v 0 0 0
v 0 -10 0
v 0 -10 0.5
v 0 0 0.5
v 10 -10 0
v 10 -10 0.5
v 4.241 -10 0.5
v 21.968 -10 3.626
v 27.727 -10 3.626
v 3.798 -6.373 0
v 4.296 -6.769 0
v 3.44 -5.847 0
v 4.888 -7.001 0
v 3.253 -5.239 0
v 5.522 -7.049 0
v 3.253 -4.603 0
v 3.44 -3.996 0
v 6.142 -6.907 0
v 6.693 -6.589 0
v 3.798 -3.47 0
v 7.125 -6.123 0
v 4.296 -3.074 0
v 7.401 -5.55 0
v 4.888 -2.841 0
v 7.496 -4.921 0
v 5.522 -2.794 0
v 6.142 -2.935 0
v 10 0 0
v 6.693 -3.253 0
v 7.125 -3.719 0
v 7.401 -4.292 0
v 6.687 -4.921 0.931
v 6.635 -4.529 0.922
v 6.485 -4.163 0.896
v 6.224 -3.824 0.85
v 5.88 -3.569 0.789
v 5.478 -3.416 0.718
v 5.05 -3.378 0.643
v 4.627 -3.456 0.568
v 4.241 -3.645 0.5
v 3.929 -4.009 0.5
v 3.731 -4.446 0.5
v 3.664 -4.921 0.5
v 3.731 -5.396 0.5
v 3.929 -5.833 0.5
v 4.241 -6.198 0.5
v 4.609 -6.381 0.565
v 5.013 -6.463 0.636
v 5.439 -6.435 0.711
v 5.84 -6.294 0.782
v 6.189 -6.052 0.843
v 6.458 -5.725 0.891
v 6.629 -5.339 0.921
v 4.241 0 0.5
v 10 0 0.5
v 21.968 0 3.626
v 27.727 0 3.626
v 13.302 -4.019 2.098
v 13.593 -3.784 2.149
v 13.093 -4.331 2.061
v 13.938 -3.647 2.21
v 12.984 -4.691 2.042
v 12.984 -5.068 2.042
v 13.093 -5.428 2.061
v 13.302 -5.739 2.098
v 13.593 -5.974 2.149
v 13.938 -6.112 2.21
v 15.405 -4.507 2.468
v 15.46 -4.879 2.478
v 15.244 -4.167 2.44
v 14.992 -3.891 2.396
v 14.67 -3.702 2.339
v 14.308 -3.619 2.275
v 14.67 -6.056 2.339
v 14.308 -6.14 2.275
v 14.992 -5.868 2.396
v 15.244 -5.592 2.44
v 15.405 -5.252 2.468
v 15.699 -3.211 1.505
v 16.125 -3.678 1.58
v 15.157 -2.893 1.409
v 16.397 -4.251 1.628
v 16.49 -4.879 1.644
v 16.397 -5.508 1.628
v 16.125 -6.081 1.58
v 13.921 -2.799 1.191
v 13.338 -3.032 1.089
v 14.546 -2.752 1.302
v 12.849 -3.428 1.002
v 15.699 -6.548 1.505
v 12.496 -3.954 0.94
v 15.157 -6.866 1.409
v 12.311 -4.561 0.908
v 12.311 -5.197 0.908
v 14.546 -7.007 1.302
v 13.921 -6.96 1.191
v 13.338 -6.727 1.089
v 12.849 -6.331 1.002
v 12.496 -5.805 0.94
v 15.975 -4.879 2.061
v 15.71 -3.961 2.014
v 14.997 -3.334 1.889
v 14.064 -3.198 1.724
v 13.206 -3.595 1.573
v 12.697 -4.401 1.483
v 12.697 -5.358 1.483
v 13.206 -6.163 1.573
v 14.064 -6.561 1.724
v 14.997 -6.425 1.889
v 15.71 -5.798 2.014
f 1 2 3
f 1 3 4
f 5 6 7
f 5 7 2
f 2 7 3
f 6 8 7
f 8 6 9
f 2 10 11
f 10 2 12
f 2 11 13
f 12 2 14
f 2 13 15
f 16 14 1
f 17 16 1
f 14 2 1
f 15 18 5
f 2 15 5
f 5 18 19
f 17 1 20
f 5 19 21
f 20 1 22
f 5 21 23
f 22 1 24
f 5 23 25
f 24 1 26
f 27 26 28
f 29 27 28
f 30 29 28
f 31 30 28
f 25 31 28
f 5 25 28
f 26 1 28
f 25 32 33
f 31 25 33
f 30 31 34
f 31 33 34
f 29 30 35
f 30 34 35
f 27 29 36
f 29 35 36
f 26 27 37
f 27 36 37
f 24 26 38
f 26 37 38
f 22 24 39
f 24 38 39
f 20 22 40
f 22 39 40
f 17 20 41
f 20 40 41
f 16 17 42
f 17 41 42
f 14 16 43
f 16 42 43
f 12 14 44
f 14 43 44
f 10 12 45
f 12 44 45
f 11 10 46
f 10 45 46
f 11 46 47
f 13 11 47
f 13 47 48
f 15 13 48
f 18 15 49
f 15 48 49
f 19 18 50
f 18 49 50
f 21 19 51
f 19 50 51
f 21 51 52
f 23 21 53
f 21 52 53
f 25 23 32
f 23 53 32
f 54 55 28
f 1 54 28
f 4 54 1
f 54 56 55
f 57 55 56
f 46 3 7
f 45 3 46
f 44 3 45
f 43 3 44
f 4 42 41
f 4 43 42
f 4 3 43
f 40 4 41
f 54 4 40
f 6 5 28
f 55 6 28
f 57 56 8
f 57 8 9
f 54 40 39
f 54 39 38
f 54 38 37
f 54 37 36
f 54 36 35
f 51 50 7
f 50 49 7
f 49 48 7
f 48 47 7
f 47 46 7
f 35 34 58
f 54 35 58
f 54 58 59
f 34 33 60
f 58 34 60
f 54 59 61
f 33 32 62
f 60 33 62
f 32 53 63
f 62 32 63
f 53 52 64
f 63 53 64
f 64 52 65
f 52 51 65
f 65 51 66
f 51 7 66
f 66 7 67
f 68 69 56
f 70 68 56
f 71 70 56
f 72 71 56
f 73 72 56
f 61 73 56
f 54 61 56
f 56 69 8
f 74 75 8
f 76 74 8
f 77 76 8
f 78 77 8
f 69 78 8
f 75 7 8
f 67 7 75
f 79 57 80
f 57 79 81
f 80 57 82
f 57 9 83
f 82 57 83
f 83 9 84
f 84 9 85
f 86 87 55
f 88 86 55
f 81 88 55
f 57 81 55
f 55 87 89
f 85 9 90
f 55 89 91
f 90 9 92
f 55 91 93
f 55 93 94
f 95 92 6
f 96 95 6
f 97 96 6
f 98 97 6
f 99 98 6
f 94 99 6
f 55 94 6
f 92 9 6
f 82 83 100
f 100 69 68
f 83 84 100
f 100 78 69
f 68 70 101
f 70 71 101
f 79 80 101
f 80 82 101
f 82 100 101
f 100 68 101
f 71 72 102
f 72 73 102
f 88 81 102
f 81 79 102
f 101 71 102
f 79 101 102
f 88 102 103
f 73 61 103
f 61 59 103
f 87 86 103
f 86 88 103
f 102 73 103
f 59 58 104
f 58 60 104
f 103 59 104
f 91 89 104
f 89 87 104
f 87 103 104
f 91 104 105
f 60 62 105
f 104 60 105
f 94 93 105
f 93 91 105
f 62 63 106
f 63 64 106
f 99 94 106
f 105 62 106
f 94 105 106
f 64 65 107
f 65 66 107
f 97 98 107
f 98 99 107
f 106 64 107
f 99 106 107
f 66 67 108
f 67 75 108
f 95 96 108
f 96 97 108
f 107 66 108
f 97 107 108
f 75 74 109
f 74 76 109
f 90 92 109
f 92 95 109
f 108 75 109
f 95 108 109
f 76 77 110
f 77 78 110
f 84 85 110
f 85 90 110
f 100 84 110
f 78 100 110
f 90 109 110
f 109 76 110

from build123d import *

# Parameters (mm, degrees)
SKETCH2_W                                         = 10
SKETCH2_H                                         = 10
BOSS_EXTRUDE1_DEPTH                               = 0.5
BOSS_EXTRUDE2_DEPTH                               = 10
CSK_FOR_1_FLAT_HEAD_SOCKET_CAP_SCREW1_D           = 2.0574
CSK_FOR_1_FLAT_HEAD_SOCKET_CAP_SCREW1_CSINK_D     = 4.2672
CSK_FOR_1_FLAT_HEAD_SOCKET_CAP_SCREW1_CSINK_ANGLE = 82
CSK_FOR_1_FLAT_HEAD_SOCKET_CAP_SCREW2_D           = 2.0574
CSK_FOR_1_FLAT_HEAD_SOCKET_CAP_SCREW2_CSINK_D     = 4.2672
CSK_FOR_1_FLAT_HEAD_SOCKET_CAP_SCREW2_CSINK_ANGLE = 82


with BuildPart() as part:
    # Sketch2 → Boss-Extrude1 (new body)
    with BuildSketch(Plane.XY):
        with Locations((5, -5)):
            Rectangle(SKETCH2_W, SKETCH2_H)
    extrude(amount=BOSS_EXTRUDE1_DEPTH)

    # Sketch3 → Boss-Extrude2 (add)
    with BuildSketch(Plane.XZ.offset(10)):
        Polygon((4.241229517, 0.5), (21.967769071, 3.625667198), (27.726539554, 3.625667198), (10, 0.5), align=None)
    extrude(amount=-BOSS_EXTRUDE2_DEPTH)

    # CSK for #1 Flat Head Socket Cap Screw1 (through all)
    with Locations(Plane(origin=(0, 0, 0), x_dir=(-1, 0, 0), z_dir=(0, 0, -1))):
        with Locations((-5.362516401, -4.921292394)):
            CounterSinkHole(CSK_FOR_1_FLAT_HEAD_SOCKET_CAP_SCREW1_D / 2, CSK_FOR_1_FLAT_HEAD_SOCKET_CAP_SCREW1_CSINK_D / 2, counter_sink_angle=CSK_FOR_1_FLAT_HEAD_SOCKET_CAP_SCREW1_CSINK_ANGLE)

    # CSK for #1 Flat Head Socket Cap Screw2 (through all)
    with Locations(Plane(origin=(0.21603186, 0, -1.225177561), x_dir=(-0.984807753, 0, -0.173648178), z_dir=(0.173648178, 0, -0.984807753))):
        with Locations((-14.39146791, -4.879407471)):
            CounterSinkHole(CSK_FOR_1_FLAT_HEAD_SOCKET_CAP_SCREW2_D / 2, CSK_FOR_1_FLAT_HEAD_SOCKET_CAP_SCREW2_CSINK_D / 2, counter_sink_angle=CSK_FOR_1_FLAT_HEAD_SOCKET_CAP_SCREW2_CSINK_ANGLE)


solid = part.part
